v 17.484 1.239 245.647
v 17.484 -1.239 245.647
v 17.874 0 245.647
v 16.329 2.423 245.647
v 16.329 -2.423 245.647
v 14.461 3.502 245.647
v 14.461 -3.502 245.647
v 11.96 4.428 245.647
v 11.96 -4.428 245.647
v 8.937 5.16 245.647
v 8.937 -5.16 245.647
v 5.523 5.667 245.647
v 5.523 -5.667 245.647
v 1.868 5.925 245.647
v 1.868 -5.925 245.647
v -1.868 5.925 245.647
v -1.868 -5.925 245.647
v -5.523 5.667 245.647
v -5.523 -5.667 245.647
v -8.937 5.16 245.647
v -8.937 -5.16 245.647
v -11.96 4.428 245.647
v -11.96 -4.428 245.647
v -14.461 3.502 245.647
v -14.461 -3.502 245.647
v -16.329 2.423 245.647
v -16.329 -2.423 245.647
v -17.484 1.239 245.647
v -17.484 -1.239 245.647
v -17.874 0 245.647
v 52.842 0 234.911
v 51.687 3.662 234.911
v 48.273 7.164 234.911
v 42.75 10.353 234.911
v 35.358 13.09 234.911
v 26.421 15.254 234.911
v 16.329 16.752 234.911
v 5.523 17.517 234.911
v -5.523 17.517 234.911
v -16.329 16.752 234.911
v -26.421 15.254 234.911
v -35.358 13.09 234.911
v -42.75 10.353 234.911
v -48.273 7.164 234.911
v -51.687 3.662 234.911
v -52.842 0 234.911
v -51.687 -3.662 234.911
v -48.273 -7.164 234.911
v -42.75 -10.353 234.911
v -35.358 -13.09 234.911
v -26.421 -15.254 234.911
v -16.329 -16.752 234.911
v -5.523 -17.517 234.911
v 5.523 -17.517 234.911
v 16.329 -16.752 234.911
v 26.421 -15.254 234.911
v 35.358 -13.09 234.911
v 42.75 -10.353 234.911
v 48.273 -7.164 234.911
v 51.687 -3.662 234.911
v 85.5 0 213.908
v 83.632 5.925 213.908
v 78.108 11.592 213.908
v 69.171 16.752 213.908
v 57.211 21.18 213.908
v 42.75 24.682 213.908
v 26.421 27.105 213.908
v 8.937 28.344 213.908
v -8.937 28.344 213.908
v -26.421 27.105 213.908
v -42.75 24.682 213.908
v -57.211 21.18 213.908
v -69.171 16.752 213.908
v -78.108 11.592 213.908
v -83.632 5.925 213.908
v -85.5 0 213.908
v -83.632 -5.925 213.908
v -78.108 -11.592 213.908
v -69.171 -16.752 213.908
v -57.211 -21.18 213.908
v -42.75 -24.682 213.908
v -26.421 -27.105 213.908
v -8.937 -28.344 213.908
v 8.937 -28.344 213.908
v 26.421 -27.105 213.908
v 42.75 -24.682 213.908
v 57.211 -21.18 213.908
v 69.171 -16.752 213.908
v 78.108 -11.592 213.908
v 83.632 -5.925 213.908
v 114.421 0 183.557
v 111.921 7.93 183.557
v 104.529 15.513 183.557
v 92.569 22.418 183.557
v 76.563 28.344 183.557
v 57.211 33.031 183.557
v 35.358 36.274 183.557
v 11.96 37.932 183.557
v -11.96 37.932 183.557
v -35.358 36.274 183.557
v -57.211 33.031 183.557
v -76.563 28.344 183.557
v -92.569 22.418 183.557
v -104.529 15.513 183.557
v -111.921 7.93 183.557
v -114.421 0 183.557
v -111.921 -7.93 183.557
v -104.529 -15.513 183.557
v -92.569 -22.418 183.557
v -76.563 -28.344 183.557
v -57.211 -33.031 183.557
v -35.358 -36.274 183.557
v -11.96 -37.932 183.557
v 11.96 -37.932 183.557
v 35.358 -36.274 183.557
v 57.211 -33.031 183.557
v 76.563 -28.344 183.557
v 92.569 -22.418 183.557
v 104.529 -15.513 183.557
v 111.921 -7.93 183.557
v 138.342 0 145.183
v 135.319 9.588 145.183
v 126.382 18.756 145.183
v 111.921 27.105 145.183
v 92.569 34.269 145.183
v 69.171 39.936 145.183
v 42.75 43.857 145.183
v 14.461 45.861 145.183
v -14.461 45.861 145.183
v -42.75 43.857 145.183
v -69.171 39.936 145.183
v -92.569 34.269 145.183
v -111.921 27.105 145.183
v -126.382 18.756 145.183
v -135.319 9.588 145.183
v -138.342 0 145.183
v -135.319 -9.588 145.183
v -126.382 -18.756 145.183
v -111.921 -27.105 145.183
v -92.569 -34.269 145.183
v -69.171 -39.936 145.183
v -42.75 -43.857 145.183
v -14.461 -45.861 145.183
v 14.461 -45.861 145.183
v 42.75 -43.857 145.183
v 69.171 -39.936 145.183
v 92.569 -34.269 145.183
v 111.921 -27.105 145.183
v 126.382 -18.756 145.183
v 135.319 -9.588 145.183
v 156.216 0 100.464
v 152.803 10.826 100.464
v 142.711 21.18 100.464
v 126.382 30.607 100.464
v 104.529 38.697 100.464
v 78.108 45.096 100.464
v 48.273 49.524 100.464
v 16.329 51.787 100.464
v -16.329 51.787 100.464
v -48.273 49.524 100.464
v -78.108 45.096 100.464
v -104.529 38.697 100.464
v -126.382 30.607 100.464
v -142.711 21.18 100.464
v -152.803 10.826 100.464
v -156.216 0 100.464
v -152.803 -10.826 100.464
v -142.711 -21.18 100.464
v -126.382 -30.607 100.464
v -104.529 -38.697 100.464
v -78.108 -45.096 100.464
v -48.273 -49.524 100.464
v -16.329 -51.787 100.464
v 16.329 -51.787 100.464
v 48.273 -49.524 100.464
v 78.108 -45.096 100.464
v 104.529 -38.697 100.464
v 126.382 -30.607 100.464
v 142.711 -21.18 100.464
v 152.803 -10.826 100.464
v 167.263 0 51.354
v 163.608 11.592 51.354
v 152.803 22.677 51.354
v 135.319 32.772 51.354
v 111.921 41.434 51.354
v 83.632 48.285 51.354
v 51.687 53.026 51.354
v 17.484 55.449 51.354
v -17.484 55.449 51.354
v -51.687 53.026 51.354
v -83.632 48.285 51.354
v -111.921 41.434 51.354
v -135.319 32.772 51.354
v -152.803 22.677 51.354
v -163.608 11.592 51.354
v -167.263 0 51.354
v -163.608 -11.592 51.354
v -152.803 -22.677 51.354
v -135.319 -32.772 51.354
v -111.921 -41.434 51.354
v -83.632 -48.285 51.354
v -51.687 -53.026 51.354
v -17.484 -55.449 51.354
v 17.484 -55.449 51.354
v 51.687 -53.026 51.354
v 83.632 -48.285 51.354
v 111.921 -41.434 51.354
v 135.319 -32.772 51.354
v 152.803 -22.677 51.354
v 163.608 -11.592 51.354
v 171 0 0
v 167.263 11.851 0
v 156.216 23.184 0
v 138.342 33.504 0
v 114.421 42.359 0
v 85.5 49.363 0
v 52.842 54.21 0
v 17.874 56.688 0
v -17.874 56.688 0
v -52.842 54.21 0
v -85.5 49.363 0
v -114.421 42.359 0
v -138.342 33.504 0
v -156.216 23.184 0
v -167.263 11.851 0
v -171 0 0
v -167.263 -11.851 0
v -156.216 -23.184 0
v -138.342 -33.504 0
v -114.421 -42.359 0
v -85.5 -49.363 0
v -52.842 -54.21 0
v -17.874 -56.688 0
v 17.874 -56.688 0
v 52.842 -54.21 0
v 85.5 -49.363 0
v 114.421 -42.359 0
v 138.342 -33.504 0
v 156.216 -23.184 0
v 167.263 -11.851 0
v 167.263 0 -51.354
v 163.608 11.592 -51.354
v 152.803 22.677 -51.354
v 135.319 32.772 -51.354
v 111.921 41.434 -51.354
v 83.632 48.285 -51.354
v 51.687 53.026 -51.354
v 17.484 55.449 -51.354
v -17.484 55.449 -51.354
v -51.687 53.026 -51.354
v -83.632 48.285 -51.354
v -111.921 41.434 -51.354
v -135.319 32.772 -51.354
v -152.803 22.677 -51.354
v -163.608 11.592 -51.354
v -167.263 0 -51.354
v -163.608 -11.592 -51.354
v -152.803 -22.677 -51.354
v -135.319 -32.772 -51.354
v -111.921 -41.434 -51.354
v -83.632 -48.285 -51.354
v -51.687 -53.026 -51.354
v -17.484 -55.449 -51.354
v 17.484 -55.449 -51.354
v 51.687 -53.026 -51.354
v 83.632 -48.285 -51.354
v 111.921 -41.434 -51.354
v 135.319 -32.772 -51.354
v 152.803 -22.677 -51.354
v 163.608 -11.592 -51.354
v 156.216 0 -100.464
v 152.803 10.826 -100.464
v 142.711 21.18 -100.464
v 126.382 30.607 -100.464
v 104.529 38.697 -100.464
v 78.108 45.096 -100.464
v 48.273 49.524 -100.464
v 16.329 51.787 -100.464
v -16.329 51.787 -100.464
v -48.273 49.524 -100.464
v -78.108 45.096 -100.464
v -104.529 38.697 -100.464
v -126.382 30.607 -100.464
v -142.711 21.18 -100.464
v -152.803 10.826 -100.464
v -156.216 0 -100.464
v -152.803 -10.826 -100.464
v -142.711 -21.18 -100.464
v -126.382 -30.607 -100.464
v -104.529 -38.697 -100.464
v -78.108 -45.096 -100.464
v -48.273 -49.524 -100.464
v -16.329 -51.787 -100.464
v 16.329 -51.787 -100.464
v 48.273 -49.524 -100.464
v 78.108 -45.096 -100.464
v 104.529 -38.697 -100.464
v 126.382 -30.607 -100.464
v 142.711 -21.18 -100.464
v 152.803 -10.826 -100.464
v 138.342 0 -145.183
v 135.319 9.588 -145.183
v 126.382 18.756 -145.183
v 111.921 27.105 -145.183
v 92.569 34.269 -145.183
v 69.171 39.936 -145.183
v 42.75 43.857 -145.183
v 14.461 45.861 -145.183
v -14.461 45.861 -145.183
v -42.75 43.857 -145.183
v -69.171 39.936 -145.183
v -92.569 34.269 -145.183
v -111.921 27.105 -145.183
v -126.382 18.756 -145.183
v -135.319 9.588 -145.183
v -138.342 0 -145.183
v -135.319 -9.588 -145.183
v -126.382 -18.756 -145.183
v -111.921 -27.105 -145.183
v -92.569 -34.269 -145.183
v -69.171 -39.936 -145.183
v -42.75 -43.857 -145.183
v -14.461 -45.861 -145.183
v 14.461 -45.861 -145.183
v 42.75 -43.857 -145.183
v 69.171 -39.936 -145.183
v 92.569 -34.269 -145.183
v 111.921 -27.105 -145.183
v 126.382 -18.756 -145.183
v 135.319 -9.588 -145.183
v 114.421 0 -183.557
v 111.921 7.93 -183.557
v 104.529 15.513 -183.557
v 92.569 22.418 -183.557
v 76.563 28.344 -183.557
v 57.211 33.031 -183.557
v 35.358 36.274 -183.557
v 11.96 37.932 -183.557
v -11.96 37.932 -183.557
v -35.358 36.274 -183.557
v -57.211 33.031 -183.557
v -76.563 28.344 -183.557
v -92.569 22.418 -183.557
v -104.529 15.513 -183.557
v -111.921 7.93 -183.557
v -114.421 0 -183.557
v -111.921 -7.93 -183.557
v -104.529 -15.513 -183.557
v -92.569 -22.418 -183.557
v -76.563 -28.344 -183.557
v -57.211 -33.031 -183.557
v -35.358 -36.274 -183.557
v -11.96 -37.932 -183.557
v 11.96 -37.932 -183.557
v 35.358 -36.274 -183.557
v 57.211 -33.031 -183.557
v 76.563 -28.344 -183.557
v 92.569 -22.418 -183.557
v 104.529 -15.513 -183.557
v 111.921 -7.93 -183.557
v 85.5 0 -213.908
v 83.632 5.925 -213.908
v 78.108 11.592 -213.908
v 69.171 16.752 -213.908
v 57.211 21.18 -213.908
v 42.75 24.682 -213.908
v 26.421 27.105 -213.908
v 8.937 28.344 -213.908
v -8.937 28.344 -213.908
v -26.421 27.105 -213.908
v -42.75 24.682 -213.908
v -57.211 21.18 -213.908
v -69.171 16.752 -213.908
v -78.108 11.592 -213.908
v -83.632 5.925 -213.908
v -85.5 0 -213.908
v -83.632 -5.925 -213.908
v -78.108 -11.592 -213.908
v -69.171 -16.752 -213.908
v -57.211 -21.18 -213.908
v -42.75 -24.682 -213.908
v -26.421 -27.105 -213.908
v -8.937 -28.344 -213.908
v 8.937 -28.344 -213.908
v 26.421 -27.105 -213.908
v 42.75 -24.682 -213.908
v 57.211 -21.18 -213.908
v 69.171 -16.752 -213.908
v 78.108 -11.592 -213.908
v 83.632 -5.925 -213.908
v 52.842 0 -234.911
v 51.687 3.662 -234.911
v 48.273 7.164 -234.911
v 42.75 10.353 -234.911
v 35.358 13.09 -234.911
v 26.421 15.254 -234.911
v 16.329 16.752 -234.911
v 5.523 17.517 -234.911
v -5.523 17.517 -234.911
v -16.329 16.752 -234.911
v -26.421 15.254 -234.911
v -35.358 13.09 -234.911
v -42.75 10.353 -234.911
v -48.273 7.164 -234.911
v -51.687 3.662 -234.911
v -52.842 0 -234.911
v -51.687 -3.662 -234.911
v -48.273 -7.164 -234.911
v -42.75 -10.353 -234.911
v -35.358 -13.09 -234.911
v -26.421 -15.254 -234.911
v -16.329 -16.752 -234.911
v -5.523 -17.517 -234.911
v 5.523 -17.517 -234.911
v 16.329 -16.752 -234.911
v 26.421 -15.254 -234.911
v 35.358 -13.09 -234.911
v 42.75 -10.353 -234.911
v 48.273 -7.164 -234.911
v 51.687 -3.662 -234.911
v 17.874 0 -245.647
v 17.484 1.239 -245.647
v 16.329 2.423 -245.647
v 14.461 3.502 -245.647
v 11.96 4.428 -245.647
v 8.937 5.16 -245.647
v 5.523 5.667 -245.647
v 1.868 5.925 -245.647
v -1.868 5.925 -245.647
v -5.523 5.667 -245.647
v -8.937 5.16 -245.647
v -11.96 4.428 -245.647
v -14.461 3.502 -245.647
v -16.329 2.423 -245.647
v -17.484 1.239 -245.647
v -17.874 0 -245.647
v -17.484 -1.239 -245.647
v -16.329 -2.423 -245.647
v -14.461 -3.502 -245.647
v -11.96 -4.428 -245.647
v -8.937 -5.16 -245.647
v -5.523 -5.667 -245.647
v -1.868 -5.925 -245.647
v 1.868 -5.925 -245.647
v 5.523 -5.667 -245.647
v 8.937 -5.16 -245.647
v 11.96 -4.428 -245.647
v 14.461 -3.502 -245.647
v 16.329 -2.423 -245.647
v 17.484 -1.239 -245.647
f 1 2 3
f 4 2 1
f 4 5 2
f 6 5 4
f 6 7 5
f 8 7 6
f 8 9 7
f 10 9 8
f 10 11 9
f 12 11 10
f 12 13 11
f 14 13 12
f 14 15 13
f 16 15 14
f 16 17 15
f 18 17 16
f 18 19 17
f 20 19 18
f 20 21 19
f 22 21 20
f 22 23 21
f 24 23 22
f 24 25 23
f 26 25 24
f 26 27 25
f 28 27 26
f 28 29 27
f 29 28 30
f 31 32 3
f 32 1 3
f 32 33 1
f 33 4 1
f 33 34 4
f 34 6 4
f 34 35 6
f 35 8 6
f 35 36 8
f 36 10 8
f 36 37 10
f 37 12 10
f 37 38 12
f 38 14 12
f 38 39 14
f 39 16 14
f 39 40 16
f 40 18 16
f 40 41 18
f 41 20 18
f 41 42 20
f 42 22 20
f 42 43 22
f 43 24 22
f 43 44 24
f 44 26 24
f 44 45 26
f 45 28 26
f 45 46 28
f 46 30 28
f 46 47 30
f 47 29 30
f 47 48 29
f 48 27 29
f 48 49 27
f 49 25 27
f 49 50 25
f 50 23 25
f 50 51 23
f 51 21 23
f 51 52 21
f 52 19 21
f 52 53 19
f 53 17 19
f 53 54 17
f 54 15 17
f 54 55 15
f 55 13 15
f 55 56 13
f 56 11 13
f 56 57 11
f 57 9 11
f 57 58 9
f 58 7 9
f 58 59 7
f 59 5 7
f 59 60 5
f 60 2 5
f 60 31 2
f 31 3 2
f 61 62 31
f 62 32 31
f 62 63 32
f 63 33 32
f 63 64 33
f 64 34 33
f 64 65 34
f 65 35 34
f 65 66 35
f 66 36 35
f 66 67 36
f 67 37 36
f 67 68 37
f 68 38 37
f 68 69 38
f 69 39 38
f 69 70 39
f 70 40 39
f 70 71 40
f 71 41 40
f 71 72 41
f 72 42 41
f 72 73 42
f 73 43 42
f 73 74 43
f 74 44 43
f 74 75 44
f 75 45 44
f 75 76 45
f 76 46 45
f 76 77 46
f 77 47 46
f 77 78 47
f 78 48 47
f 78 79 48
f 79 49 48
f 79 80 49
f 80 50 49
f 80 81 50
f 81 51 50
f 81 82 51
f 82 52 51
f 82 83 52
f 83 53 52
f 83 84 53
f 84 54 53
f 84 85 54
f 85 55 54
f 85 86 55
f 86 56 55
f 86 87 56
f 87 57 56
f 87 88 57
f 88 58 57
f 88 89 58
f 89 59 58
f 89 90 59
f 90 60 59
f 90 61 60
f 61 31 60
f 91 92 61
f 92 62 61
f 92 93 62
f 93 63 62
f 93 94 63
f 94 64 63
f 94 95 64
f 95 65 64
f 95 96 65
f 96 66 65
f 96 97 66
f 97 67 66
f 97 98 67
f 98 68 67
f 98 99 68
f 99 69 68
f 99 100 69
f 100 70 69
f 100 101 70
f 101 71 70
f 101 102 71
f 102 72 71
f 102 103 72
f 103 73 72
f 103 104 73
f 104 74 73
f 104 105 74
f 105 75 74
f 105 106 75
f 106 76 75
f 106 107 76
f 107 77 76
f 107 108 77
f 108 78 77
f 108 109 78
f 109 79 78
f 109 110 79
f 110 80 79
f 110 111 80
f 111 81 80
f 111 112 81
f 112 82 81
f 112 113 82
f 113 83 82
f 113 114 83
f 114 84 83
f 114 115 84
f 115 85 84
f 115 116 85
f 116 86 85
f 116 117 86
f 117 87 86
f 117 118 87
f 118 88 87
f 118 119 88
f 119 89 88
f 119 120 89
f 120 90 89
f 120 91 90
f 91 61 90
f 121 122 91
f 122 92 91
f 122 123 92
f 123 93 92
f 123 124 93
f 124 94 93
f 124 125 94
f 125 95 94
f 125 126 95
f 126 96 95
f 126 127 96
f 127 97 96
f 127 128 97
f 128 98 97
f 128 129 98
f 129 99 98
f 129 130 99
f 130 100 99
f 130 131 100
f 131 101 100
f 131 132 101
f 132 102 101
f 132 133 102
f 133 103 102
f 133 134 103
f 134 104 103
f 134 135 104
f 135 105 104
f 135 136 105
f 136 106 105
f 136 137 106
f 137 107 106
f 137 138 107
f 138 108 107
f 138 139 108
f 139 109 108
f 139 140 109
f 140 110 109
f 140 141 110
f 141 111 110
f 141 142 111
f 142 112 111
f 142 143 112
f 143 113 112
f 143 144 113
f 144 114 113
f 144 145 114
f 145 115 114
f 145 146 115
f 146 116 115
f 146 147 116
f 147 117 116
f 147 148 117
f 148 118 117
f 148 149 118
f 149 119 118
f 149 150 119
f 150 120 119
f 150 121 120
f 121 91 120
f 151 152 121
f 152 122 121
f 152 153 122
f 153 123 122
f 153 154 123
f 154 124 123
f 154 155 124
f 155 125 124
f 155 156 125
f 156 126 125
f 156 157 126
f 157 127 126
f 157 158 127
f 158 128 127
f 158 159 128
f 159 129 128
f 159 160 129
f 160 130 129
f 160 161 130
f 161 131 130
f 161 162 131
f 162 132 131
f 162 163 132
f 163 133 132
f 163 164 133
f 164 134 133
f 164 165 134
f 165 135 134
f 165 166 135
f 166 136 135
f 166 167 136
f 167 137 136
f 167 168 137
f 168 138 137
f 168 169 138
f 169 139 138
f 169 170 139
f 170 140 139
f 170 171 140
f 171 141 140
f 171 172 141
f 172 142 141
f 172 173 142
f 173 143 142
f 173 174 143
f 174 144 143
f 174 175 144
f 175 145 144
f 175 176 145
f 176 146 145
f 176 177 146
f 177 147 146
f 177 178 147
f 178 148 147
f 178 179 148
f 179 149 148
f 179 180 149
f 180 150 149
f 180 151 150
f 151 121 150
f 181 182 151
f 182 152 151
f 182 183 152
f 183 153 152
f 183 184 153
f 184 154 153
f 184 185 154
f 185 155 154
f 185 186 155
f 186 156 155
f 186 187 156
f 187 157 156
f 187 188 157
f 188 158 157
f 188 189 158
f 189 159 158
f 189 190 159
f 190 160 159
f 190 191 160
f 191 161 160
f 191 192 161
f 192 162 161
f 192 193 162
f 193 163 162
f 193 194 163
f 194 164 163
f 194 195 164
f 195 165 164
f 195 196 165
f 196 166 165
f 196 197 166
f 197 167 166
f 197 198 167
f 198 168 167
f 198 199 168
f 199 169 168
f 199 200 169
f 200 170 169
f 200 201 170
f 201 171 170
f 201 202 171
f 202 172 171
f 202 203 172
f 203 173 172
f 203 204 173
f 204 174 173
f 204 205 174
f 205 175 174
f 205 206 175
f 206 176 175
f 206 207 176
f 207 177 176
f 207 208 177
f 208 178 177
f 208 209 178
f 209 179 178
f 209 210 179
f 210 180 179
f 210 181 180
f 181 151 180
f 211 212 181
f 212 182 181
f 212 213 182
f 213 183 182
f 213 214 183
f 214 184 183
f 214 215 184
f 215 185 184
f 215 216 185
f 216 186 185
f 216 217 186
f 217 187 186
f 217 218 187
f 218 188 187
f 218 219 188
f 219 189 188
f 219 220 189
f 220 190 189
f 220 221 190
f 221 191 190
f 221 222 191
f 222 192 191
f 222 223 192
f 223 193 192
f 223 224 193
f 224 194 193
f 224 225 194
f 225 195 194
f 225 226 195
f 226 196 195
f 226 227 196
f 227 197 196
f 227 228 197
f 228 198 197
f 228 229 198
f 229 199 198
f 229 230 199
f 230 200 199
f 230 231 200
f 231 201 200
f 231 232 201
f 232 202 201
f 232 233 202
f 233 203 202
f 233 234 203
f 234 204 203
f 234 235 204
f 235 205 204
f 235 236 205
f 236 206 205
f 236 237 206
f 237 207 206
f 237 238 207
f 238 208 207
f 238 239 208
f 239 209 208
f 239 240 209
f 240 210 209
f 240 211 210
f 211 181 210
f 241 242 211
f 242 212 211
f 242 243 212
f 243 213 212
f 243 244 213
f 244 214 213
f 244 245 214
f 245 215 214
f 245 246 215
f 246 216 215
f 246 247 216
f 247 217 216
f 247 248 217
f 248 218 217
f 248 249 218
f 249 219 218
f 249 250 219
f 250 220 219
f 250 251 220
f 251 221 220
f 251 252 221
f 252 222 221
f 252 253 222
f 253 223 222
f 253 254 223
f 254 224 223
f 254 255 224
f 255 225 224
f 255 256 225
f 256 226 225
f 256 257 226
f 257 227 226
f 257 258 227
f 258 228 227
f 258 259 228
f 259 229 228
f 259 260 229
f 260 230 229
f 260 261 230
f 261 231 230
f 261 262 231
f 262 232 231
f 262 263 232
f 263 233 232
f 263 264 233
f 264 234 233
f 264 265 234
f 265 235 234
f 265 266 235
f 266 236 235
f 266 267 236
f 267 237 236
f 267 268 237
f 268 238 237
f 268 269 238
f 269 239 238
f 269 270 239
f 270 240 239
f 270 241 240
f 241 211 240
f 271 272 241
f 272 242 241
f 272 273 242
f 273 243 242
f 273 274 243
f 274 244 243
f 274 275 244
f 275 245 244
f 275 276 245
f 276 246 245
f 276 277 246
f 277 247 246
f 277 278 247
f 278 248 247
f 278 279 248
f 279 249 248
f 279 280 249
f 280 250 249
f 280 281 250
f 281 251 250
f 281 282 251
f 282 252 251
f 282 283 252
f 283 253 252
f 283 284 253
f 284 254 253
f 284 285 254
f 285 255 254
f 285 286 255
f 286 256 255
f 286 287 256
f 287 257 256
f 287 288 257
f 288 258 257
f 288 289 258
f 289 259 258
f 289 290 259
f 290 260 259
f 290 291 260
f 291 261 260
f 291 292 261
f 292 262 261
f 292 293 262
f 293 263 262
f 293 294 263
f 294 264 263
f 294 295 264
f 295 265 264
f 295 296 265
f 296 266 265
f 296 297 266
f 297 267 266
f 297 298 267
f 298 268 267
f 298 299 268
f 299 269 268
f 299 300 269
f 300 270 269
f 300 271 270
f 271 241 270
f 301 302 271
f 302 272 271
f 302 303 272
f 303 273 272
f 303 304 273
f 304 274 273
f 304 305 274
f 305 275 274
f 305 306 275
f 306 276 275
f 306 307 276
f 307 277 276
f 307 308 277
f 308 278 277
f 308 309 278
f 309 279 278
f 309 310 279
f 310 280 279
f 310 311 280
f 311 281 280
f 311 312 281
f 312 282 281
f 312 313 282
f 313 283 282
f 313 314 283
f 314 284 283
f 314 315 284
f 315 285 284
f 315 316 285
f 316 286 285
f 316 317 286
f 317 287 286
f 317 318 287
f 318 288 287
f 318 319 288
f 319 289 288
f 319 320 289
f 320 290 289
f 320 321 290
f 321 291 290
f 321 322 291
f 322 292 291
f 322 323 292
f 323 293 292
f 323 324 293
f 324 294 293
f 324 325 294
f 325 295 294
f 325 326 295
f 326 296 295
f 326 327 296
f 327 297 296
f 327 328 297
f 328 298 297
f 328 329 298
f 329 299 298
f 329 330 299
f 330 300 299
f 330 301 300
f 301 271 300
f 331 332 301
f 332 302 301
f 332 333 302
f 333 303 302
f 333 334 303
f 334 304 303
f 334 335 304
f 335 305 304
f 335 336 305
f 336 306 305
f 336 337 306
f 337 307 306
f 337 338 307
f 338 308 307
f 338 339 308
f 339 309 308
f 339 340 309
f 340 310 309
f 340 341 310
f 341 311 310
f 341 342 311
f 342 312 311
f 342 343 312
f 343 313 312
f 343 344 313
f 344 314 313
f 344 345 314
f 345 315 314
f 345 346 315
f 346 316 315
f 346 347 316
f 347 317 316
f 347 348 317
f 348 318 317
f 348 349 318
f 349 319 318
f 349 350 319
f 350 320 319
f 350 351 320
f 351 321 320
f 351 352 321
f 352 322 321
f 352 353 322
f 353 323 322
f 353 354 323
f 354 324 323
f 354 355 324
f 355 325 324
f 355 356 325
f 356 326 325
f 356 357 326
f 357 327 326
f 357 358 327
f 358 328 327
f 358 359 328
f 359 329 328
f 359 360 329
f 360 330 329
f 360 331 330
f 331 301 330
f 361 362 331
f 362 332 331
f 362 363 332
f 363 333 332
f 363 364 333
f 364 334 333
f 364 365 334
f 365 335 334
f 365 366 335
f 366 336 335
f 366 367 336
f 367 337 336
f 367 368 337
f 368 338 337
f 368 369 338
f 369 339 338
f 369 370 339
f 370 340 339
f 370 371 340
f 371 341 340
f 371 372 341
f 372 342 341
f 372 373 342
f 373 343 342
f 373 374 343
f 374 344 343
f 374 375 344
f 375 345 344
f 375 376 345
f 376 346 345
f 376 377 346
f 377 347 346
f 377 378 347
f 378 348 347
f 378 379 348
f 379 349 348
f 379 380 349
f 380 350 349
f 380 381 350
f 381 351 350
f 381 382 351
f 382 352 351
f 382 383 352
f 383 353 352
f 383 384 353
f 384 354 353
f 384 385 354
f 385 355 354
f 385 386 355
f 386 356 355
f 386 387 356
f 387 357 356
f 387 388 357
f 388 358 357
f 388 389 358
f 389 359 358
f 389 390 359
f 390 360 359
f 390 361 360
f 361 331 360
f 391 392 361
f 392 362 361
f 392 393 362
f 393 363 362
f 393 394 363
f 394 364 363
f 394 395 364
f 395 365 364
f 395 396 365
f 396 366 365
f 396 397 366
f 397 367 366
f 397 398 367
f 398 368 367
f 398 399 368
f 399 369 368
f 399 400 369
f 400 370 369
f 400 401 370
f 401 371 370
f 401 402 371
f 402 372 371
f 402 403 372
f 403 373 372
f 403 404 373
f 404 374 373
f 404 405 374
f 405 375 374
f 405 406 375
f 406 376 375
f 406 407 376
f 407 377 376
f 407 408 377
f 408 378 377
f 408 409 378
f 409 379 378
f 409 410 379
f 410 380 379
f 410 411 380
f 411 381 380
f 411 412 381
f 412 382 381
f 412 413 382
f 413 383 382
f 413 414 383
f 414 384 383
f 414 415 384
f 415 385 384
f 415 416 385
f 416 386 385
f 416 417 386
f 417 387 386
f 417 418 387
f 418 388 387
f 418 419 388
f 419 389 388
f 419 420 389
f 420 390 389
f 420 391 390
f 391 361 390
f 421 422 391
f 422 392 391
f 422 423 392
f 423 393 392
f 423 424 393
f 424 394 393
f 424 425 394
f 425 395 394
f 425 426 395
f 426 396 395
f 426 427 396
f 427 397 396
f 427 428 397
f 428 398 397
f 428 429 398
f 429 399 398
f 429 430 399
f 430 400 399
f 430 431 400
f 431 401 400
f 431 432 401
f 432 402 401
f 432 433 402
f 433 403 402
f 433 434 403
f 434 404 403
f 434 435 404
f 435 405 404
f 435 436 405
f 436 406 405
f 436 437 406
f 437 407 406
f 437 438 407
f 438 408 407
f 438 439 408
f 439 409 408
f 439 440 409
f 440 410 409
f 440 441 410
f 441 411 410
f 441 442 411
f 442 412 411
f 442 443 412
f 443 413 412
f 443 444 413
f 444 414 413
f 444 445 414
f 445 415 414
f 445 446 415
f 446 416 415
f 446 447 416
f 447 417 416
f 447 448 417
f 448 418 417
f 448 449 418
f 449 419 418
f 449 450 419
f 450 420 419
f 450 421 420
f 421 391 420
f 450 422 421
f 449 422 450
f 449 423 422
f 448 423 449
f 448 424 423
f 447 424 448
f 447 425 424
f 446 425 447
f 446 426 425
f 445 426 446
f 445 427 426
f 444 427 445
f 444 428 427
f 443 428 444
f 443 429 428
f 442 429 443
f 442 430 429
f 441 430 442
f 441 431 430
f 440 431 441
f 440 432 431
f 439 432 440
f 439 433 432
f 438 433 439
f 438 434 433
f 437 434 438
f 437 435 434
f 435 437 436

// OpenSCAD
// Generated by SolidPython 1.0.1 on 2020-07-29 00:46:48


scale(v = [9, 3, 13]) {
	sphere(r = 19);
}
/***********************************************
*********      SolidPython code:      **********
************************************************
 
# import packages: SolidPython
from solid import *
from solid.utils import *
from itertools import chain, combinations, permutations


class Resize:

    def __init__(self, scad_file):
        self.scad_file = scad_file
        #self.scad_file = import_scad(scad_file)
        # cone/cylinder param:
        self.r1 = 0
        self.r2 = 0
        self.h = 0
        # rectangular prism param:
        self.w = 0
        self.l = 0
        # ellipse param:
        self.r = 0

    # import OpenScad code (file name corresponds to shape)


    # classify shape + parameters
    def assign(self, param1, param2, param3):
        if self.scad_file == 'cone.scad':
            self.r1 = param1
            self.r2 = param2
            self.h = param3
        elif self.scad_file == 'cylinder.scad':
            self.r1 = param1
            self.r2 = param2
            self.h = param3
        elif self.scad_file == 'rectangularPrism.scad':
            self.h = param1
            self.l = param2
            self.w = param3
        else:
            self.r = param1
            self.h = param2

    # resize parameters
    def iterate(self):
        x = range(3, 20, 2)
        i = 1
        if self.scad_file == 'cone.scad':
            tempList = list(permutations(x, 2))
            for temp in tempList:
                param1 = temp[0]
                param2 = temp[1]
                filepath = 'produced_scad_files/' + 'cone' + str(param1) + '_' + str(param2) + '_' + '.scad'
                scad_render_to_file(cylinder(h=param1, r1=param2, r2=0), filepath)

        elif self.scad_file == 'cylinder.scad':
            tempList = list(permutations(x, 3))
            for temp in tempList:
                param1 = temp[0]
                param2 = temp[1]
                filepath = 'produced_scad_files/' + 'cylinder' + str(param1) + '_' + str(param2) + '_' + '.scad'
                scad_render_to_file(cylinder(h=param1, r1=param2, r2=param2), filepath)

        elif self.scad_file == 'rectangularPrism.scad':
            tempList = list(permutations(x, 3))
            for temp in tempList:
                param1 = temp[0]
                param2 = temp[1]
                param3 = temp[2]
                filepath = 'produced_scad_files/' + 'rectangularPrism' + str(param1) + '_' + str(param2) + '_' + str(
                    param3) + '.scad'
                scad_render_to_file(cube(size=(param1, param2, param3)), filepath)

        elif self.scad_file == 'ellipse.scad':
            tempList = list(permutations(x, 4))
            for temp in tempList:
                param1 = temp[0]
                param2 = temp[1]
                param3 = temp[2]
                param4 = temp[3]
                filepath = 'produced_scad_files/' + 'ellipse' + str(param1) + '_' + str(param2) + '_' + str(param3) + '_' + str(param4) + '.scad'
                scad_render_to_file(scale([param1, param2, param3])(sphere(r=param4)), filepath)

    def render_to_scadfile(self):
        scad_render_to_file(scad, 'example.scad') 
 
************************************************/
